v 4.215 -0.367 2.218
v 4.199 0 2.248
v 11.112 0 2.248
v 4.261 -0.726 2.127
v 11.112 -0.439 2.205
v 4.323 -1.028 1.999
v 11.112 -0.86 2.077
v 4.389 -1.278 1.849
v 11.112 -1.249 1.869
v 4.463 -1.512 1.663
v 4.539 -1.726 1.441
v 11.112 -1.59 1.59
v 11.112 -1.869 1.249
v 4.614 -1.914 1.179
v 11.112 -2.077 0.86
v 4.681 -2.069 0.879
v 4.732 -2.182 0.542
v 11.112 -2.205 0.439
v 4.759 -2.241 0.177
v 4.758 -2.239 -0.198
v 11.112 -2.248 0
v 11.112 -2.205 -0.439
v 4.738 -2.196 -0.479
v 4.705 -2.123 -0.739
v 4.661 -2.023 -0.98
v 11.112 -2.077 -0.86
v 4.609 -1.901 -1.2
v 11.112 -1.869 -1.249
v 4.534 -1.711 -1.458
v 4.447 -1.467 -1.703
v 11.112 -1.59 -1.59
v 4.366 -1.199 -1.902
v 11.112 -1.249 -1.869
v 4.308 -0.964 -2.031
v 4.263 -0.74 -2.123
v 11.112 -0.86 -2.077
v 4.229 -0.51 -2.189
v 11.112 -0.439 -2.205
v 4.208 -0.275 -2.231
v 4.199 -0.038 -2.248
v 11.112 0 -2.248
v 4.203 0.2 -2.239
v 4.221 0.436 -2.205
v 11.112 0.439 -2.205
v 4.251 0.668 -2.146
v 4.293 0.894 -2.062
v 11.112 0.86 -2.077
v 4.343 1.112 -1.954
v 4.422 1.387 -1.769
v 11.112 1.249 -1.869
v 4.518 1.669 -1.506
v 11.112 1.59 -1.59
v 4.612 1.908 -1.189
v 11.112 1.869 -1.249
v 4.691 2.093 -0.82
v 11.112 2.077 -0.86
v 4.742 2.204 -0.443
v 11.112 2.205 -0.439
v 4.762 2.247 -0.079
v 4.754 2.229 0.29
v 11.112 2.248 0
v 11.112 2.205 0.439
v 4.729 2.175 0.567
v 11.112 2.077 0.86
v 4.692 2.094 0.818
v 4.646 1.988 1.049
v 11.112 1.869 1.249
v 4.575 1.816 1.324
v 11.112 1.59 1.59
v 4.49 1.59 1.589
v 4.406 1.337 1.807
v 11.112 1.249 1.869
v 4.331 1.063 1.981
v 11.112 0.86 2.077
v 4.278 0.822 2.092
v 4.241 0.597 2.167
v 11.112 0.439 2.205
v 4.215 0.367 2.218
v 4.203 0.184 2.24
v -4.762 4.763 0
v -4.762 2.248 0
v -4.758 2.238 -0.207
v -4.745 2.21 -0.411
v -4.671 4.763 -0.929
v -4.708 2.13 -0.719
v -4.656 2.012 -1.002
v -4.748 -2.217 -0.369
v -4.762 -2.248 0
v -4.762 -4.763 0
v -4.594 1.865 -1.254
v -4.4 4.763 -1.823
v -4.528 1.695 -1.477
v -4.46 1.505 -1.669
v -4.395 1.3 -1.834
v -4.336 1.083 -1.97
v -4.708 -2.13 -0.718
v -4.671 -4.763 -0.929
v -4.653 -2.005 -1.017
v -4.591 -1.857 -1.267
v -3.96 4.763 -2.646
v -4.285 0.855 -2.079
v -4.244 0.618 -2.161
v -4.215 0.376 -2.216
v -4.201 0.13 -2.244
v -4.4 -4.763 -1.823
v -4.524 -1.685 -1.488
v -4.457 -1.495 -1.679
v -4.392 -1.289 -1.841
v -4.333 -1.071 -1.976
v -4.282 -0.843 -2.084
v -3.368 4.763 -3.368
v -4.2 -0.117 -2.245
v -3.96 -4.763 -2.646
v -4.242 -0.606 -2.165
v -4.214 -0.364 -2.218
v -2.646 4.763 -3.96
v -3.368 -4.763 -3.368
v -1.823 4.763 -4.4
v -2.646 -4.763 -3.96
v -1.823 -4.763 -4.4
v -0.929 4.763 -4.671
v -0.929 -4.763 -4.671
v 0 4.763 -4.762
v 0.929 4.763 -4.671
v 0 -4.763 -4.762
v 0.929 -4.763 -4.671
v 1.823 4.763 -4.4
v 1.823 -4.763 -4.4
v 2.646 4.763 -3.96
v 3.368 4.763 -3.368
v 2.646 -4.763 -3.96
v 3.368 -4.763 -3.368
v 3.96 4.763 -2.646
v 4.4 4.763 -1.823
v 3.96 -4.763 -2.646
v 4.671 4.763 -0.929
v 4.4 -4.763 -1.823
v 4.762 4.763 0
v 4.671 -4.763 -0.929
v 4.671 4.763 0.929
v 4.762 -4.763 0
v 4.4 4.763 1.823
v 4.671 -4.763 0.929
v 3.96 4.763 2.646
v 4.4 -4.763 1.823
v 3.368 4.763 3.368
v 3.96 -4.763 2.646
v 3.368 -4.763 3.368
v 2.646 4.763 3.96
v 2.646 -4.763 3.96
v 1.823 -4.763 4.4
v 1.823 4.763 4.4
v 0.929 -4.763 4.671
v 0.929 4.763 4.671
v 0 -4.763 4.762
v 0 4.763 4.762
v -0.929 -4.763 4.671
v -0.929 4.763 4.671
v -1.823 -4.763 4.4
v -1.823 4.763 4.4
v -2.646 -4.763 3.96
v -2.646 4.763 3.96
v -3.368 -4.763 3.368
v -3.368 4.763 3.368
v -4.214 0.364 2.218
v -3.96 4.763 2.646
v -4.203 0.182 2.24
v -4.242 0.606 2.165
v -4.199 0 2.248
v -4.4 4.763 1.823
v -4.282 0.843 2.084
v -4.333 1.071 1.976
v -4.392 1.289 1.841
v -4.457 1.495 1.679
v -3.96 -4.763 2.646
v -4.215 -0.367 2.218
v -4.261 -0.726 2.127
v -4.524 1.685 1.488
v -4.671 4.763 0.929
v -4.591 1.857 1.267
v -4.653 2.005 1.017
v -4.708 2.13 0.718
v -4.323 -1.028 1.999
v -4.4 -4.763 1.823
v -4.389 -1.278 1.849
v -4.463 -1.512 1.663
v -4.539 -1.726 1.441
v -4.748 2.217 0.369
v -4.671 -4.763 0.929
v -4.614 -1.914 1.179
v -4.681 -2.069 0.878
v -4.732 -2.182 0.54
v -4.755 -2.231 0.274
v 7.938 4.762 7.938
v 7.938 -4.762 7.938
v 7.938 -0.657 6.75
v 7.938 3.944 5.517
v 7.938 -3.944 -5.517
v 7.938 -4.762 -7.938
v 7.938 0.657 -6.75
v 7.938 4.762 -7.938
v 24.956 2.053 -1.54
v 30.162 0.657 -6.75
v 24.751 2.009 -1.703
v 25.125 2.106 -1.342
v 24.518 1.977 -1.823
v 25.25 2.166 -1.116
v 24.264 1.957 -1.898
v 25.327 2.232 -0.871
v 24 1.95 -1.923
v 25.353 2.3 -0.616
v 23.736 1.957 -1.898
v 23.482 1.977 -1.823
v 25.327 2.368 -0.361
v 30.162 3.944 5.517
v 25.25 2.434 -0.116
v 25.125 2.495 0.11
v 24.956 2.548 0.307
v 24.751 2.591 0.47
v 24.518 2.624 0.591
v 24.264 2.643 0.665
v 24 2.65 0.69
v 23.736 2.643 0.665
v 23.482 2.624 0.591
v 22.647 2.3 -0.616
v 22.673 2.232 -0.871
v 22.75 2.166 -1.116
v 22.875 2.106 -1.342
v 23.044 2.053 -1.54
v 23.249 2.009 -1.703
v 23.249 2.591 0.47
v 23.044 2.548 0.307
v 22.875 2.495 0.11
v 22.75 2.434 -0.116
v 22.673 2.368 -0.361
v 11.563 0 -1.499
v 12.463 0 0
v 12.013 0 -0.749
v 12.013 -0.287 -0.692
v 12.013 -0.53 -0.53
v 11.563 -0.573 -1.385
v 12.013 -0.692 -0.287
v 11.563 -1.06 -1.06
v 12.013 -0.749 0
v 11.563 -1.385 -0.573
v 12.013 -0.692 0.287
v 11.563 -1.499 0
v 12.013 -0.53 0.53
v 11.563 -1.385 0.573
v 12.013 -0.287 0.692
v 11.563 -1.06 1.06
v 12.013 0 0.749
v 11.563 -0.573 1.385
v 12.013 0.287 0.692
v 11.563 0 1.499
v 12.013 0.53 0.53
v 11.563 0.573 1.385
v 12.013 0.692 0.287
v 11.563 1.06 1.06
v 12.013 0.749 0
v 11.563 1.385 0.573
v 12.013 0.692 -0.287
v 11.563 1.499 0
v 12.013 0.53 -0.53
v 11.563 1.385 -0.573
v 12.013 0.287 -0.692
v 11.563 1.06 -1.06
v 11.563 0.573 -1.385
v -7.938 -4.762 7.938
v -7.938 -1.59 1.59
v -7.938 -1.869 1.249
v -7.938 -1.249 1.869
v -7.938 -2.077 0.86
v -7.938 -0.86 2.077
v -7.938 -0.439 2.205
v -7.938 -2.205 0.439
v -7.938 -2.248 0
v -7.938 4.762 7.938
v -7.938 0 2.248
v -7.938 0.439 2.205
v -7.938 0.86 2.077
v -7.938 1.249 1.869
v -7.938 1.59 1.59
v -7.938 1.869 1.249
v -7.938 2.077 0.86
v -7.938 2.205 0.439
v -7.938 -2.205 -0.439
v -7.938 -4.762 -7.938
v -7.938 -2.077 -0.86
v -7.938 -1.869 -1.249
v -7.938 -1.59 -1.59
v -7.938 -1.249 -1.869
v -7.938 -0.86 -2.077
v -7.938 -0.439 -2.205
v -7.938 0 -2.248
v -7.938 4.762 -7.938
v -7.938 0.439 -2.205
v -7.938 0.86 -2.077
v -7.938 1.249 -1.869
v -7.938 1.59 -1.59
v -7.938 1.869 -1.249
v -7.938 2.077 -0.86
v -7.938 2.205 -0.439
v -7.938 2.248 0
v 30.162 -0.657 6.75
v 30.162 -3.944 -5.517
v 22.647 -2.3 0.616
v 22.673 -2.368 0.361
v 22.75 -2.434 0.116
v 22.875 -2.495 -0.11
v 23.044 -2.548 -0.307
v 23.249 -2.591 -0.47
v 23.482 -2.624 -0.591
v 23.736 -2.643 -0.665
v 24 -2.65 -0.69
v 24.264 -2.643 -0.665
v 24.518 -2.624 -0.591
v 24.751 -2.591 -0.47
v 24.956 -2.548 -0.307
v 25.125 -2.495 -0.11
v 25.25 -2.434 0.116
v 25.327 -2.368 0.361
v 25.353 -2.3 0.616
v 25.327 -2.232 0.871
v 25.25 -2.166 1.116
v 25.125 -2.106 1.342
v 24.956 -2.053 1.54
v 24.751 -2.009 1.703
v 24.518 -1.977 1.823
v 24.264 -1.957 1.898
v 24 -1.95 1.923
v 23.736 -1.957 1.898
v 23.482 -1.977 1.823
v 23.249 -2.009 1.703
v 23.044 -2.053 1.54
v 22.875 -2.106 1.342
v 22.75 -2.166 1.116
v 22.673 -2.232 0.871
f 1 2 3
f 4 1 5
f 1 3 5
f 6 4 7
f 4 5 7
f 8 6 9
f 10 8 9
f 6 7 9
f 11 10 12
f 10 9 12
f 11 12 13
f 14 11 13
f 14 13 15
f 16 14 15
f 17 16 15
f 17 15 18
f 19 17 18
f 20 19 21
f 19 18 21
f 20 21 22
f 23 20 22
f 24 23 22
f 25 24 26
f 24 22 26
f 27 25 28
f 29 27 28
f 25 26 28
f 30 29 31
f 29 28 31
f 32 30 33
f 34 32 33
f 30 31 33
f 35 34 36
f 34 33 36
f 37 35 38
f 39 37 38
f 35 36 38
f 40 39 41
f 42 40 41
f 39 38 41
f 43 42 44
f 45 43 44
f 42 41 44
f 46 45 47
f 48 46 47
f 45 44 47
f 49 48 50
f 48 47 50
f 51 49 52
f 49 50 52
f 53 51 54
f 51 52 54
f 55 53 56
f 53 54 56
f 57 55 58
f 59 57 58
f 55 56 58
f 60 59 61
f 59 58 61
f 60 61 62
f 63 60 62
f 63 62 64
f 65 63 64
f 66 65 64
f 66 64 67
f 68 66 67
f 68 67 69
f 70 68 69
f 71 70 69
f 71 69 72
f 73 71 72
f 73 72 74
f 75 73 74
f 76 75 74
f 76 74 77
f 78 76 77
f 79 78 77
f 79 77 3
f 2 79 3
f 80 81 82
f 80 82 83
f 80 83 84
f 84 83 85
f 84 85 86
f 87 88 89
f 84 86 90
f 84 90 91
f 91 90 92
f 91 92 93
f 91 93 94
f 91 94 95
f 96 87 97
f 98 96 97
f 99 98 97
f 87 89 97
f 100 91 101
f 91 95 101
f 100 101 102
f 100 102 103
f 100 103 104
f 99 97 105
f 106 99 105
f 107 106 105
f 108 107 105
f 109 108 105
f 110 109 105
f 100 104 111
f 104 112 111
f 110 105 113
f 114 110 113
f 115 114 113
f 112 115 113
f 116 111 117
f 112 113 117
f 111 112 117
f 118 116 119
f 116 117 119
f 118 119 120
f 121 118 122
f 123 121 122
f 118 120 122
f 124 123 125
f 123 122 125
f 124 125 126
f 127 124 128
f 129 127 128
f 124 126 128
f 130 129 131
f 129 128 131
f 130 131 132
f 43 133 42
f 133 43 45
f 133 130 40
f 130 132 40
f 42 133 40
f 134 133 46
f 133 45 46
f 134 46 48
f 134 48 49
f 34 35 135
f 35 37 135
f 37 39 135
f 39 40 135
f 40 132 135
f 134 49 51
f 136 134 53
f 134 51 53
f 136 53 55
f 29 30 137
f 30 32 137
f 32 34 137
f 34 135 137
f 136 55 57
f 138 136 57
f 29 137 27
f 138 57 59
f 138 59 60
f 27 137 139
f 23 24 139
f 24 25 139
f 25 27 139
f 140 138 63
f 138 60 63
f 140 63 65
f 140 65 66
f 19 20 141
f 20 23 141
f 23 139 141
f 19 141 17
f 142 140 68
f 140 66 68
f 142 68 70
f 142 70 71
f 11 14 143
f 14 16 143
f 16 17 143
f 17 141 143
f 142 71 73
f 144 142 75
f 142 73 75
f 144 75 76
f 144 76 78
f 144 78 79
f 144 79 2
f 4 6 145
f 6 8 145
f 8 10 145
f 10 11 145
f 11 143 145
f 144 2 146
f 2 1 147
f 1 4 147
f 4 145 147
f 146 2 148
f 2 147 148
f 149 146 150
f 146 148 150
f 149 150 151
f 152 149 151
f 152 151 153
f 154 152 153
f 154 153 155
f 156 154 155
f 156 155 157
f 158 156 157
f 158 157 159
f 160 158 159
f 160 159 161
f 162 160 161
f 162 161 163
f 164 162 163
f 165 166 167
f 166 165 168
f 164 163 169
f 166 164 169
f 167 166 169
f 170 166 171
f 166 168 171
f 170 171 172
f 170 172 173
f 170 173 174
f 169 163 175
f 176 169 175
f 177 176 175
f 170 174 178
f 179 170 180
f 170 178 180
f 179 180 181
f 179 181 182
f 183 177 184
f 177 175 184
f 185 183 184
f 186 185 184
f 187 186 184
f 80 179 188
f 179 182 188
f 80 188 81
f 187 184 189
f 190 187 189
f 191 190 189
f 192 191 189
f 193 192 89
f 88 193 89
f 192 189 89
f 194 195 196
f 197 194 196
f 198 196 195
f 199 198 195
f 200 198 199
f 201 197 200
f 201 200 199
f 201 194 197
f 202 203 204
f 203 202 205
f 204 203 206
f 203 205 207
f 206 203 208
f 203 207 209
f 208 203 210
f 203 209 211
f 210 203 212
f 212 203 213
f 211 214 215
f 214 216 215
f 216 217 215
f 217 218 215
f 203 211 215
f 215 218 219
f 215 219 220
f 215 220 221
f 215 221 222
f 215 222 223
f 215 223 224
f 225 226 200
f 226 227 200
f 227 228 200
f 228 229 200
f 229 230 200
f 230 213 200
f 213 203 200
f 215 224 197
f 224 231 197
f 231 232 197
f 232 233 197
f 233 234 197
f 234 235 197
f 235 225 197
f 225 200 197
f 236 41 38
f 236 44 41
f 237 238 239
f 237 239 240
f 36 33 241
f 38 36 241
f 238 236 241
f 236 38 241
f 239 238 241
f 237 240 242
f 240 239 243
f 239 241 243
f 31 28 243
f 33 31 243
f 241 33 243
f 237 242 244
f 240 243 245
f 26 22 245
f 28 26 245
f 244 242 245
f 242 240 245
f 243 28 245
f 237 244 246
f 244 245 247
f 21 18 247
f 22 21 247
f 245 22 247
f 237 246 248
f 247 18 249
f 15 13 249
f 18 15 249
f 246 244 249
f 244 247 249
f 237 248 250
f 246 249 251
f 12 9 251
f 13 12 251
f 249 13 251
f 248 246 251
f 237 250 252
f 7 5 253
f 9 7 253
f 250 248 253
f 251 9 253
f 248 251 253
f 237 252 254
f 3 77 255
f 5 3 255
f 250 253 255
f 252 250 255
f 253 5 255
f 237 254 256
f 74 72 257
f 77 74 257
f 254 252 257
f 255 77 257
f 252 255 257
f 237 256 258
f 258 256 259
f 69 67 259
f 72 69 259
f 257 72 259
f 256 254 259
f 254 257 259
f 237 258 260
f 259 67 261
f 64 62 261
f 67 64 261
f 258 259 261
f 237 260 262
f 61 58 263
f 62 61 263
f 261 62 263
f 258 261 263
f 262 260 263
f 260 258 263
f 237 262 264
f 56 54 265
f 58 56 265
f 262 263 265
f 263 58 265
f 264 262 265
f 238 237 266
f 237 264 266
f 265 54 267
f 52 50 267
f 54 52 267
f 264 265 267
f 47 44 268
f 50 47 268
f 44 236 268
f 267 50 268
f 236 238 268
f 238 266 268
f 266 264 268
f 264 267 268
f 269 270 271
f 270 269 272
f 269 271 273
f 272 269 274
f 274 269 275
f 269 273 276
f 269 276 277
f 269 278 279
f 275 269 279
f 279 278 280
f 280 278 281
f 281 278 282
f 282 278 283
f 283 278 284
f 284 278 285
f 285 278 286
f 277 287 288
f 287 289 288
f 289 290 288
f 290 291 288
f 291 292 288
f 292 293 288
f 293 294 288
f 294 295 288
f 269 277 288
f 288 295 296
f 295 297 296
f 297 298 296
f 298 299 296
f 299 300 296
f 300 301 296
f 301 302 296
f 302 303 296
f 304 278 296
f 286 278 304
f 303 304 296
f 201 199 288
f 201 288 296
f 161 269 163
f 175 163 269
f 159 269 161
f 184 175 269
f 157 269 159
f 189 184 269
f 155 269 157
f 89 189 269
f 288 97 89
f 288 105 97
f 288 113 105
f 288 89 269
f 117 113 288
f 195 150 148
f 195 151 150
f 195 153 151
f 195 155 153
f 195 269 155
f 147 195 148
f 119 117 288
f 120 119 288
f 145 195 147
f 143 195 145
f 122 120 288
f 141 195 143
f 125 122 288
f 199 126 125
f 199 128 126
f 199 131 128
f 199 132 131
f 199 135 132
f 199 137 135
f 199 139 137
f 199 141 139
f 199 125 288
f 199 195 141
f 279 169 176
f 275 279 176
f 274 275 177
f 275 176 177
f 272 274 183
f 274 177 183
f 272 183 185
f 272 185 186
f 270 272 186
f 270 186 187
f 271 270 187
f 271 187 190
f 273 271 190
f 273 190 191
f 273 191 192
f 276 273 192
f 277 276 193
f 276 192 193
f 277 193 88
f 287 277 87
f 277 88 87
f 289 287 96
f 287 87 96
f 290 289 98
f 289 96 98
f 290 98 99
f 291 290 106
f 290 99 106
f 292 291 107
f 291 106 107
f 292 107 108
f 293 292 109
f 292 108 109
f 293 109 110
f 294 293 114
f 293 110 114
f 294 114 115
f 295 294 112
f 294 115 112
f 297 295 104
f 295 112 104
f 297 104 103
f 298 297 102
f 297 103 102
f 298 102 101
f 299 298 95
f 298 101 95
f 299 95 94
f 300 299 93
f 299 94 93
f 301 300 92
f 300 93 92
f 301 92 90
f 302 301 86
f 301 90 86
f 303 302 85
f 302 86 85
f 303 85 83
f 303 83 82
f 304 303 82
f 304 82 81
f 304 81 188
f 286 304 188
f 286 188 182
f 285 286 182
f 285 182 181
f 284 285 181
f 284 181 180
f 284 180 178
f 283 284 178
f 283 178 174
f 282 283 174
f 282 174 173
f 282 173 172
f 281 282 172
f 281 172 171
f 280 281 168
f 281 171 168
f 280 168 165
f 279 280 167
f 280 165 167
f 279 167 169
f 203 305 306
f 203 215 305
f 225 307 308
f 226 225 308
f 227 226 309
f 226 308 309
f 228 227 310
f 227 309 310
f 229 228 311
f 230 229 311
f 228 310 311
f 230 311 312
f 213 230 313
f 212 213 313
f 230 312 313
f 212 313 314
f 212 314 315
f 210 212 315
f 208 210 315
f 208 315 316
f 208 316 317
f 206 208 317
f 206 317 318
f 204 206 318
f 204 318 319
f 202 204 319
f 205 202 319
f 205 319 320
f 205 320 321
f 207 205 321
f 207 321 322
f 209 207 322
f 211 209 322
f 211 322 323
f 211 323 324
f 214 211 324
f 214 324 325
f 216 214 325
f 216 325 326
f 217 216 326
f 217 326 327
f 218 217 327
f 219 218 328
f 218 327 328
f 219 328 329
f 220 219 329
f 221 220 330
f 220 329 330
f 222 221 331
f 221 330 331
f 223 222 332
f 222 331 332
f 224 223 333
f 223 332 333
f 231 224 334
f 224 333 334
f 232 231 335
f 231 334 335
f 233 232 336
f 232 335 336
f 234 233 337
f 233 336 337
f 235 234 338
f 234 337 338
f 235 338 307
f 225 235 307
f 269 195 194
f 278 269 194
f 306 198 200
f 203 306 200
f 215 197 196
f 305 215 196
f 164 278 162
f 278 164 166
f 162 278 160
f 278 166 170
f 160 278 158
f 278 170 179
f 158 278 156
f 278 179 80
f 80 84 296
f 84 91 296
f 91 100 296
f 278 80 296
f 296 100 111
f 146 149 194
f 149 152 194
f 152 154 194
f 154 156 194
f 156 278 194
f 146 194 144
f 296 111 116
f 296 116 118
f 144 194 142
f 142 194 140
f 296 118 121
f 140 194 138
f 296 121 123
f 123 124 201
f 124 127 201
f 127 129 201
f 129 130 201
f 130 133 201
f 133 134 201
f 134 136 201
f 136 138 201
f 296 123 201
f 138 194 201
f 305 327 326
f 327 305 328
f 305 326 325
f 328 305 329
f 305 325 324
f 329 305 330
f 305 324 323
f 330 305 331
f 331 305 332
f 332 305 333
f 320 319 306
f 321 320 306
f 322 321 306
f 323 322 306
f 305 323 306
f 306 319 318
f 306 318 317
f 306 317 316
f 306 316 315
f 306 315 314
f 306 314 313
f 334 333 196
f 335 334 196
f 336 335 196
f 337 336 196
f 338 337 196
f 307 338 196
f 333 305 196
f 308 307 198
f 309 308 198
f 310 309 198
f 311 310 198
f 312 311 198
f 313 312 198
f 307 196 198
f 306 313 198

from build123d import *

# Parameters (mm, degrees)
SKETCH1_W                    = 15.875
SKETCH1_H                    = 9.525
BOSS_EXTRUDE1_DEPTH          = 7.9375
BOSS_EXTRUDE2_DEPTH          = 22.225
F_3_8_0_375_DIAMETER_HOLE1_D = 9.525
F_6_32_TAPPED_HOLE1_D        = 2.7051
F_8_CLEARANCE_HOLE1_D        = 4.4958
F_8_CLEARANCE_HOLE1_DEPTH    = 19.05
F_8_CLEARANCE_HOLE1_TIP      = 1.350674586


with BuildPart() as part:
    # Sketch1 → Boss-Extrude1 (new body, symmetric)
    with BuildSketch(Plane(origin=(0, 0, 0), x_dir=(0, 0, -1), z_dir=(1, 0, 0))):
        Rectangle(SKETCH1_W, SKETCH1_H)
    extrude(amount=BOSS_EXTRUDE1_DEPTH, both=True)

    # Sketch2 → Boss-Extrude2 (add)
    with BuildSketch(Plane(origin=(7.9375, 0, 0), x_dir=(0, 0, -1), z_dir=(1, 0, 0))):
        Polygon((-6.749941848, -0.656609937), (5.517316146, -3.94361181), (6.749941848, 0.656609937), (-5.517316146, 3.94361181), align=None)
    extrude(amount=BOSS_EXTRUDE2_DEPTH)

    # 3/8 (0.375) Diameter Hole1 (through all)
    with Locations(Plane(origin=(0, 4.7625, 0), x_dir=(1, 0, 0), z_dir=(0, 1, 0))):
        with Locations((0, 0)):
            Hole(F_3_8_0_375_DIAMETER_HOLE1_D / 2)

    # #6-32 Tapped Hole1 (through all)
    with Locations(Plane(origin=(0, 2.300110874, -0.616312851), x_dir=(1, 0, 0), z_dir=(0, 0.965925826, -0.258819045))):
        with Locations((24, 0)):
            Hole(F_6_32_TAPPED_HOLE1_D / 2)

    # #8 Clearance Hole1
    with Locations(Plane(origin=(-7.9375, 0, 0), x_dir=(0, 0, -1), z_dir=(-1, 0, 0))):
        with Locations((0, 0)):
            Hole(F_8_CLEARANCE_HOLE1_D / 2, depth=F_8_CLEARANCE_HOLE1_DEPTH)
            with Locations((0, 0, -(F_8_CLEARANCE_HOLE1_DEPTH + F_8_CLEARANCE_HOLE1_TIP / 2))):  # 118° drill point
                Cone(0, F_8_CLEARANCE_HOLE1_D / 2, F_8_CLEARANCE_HOLE1_TIP, mode=Mode.SUBTRACT)


solid = part.part
